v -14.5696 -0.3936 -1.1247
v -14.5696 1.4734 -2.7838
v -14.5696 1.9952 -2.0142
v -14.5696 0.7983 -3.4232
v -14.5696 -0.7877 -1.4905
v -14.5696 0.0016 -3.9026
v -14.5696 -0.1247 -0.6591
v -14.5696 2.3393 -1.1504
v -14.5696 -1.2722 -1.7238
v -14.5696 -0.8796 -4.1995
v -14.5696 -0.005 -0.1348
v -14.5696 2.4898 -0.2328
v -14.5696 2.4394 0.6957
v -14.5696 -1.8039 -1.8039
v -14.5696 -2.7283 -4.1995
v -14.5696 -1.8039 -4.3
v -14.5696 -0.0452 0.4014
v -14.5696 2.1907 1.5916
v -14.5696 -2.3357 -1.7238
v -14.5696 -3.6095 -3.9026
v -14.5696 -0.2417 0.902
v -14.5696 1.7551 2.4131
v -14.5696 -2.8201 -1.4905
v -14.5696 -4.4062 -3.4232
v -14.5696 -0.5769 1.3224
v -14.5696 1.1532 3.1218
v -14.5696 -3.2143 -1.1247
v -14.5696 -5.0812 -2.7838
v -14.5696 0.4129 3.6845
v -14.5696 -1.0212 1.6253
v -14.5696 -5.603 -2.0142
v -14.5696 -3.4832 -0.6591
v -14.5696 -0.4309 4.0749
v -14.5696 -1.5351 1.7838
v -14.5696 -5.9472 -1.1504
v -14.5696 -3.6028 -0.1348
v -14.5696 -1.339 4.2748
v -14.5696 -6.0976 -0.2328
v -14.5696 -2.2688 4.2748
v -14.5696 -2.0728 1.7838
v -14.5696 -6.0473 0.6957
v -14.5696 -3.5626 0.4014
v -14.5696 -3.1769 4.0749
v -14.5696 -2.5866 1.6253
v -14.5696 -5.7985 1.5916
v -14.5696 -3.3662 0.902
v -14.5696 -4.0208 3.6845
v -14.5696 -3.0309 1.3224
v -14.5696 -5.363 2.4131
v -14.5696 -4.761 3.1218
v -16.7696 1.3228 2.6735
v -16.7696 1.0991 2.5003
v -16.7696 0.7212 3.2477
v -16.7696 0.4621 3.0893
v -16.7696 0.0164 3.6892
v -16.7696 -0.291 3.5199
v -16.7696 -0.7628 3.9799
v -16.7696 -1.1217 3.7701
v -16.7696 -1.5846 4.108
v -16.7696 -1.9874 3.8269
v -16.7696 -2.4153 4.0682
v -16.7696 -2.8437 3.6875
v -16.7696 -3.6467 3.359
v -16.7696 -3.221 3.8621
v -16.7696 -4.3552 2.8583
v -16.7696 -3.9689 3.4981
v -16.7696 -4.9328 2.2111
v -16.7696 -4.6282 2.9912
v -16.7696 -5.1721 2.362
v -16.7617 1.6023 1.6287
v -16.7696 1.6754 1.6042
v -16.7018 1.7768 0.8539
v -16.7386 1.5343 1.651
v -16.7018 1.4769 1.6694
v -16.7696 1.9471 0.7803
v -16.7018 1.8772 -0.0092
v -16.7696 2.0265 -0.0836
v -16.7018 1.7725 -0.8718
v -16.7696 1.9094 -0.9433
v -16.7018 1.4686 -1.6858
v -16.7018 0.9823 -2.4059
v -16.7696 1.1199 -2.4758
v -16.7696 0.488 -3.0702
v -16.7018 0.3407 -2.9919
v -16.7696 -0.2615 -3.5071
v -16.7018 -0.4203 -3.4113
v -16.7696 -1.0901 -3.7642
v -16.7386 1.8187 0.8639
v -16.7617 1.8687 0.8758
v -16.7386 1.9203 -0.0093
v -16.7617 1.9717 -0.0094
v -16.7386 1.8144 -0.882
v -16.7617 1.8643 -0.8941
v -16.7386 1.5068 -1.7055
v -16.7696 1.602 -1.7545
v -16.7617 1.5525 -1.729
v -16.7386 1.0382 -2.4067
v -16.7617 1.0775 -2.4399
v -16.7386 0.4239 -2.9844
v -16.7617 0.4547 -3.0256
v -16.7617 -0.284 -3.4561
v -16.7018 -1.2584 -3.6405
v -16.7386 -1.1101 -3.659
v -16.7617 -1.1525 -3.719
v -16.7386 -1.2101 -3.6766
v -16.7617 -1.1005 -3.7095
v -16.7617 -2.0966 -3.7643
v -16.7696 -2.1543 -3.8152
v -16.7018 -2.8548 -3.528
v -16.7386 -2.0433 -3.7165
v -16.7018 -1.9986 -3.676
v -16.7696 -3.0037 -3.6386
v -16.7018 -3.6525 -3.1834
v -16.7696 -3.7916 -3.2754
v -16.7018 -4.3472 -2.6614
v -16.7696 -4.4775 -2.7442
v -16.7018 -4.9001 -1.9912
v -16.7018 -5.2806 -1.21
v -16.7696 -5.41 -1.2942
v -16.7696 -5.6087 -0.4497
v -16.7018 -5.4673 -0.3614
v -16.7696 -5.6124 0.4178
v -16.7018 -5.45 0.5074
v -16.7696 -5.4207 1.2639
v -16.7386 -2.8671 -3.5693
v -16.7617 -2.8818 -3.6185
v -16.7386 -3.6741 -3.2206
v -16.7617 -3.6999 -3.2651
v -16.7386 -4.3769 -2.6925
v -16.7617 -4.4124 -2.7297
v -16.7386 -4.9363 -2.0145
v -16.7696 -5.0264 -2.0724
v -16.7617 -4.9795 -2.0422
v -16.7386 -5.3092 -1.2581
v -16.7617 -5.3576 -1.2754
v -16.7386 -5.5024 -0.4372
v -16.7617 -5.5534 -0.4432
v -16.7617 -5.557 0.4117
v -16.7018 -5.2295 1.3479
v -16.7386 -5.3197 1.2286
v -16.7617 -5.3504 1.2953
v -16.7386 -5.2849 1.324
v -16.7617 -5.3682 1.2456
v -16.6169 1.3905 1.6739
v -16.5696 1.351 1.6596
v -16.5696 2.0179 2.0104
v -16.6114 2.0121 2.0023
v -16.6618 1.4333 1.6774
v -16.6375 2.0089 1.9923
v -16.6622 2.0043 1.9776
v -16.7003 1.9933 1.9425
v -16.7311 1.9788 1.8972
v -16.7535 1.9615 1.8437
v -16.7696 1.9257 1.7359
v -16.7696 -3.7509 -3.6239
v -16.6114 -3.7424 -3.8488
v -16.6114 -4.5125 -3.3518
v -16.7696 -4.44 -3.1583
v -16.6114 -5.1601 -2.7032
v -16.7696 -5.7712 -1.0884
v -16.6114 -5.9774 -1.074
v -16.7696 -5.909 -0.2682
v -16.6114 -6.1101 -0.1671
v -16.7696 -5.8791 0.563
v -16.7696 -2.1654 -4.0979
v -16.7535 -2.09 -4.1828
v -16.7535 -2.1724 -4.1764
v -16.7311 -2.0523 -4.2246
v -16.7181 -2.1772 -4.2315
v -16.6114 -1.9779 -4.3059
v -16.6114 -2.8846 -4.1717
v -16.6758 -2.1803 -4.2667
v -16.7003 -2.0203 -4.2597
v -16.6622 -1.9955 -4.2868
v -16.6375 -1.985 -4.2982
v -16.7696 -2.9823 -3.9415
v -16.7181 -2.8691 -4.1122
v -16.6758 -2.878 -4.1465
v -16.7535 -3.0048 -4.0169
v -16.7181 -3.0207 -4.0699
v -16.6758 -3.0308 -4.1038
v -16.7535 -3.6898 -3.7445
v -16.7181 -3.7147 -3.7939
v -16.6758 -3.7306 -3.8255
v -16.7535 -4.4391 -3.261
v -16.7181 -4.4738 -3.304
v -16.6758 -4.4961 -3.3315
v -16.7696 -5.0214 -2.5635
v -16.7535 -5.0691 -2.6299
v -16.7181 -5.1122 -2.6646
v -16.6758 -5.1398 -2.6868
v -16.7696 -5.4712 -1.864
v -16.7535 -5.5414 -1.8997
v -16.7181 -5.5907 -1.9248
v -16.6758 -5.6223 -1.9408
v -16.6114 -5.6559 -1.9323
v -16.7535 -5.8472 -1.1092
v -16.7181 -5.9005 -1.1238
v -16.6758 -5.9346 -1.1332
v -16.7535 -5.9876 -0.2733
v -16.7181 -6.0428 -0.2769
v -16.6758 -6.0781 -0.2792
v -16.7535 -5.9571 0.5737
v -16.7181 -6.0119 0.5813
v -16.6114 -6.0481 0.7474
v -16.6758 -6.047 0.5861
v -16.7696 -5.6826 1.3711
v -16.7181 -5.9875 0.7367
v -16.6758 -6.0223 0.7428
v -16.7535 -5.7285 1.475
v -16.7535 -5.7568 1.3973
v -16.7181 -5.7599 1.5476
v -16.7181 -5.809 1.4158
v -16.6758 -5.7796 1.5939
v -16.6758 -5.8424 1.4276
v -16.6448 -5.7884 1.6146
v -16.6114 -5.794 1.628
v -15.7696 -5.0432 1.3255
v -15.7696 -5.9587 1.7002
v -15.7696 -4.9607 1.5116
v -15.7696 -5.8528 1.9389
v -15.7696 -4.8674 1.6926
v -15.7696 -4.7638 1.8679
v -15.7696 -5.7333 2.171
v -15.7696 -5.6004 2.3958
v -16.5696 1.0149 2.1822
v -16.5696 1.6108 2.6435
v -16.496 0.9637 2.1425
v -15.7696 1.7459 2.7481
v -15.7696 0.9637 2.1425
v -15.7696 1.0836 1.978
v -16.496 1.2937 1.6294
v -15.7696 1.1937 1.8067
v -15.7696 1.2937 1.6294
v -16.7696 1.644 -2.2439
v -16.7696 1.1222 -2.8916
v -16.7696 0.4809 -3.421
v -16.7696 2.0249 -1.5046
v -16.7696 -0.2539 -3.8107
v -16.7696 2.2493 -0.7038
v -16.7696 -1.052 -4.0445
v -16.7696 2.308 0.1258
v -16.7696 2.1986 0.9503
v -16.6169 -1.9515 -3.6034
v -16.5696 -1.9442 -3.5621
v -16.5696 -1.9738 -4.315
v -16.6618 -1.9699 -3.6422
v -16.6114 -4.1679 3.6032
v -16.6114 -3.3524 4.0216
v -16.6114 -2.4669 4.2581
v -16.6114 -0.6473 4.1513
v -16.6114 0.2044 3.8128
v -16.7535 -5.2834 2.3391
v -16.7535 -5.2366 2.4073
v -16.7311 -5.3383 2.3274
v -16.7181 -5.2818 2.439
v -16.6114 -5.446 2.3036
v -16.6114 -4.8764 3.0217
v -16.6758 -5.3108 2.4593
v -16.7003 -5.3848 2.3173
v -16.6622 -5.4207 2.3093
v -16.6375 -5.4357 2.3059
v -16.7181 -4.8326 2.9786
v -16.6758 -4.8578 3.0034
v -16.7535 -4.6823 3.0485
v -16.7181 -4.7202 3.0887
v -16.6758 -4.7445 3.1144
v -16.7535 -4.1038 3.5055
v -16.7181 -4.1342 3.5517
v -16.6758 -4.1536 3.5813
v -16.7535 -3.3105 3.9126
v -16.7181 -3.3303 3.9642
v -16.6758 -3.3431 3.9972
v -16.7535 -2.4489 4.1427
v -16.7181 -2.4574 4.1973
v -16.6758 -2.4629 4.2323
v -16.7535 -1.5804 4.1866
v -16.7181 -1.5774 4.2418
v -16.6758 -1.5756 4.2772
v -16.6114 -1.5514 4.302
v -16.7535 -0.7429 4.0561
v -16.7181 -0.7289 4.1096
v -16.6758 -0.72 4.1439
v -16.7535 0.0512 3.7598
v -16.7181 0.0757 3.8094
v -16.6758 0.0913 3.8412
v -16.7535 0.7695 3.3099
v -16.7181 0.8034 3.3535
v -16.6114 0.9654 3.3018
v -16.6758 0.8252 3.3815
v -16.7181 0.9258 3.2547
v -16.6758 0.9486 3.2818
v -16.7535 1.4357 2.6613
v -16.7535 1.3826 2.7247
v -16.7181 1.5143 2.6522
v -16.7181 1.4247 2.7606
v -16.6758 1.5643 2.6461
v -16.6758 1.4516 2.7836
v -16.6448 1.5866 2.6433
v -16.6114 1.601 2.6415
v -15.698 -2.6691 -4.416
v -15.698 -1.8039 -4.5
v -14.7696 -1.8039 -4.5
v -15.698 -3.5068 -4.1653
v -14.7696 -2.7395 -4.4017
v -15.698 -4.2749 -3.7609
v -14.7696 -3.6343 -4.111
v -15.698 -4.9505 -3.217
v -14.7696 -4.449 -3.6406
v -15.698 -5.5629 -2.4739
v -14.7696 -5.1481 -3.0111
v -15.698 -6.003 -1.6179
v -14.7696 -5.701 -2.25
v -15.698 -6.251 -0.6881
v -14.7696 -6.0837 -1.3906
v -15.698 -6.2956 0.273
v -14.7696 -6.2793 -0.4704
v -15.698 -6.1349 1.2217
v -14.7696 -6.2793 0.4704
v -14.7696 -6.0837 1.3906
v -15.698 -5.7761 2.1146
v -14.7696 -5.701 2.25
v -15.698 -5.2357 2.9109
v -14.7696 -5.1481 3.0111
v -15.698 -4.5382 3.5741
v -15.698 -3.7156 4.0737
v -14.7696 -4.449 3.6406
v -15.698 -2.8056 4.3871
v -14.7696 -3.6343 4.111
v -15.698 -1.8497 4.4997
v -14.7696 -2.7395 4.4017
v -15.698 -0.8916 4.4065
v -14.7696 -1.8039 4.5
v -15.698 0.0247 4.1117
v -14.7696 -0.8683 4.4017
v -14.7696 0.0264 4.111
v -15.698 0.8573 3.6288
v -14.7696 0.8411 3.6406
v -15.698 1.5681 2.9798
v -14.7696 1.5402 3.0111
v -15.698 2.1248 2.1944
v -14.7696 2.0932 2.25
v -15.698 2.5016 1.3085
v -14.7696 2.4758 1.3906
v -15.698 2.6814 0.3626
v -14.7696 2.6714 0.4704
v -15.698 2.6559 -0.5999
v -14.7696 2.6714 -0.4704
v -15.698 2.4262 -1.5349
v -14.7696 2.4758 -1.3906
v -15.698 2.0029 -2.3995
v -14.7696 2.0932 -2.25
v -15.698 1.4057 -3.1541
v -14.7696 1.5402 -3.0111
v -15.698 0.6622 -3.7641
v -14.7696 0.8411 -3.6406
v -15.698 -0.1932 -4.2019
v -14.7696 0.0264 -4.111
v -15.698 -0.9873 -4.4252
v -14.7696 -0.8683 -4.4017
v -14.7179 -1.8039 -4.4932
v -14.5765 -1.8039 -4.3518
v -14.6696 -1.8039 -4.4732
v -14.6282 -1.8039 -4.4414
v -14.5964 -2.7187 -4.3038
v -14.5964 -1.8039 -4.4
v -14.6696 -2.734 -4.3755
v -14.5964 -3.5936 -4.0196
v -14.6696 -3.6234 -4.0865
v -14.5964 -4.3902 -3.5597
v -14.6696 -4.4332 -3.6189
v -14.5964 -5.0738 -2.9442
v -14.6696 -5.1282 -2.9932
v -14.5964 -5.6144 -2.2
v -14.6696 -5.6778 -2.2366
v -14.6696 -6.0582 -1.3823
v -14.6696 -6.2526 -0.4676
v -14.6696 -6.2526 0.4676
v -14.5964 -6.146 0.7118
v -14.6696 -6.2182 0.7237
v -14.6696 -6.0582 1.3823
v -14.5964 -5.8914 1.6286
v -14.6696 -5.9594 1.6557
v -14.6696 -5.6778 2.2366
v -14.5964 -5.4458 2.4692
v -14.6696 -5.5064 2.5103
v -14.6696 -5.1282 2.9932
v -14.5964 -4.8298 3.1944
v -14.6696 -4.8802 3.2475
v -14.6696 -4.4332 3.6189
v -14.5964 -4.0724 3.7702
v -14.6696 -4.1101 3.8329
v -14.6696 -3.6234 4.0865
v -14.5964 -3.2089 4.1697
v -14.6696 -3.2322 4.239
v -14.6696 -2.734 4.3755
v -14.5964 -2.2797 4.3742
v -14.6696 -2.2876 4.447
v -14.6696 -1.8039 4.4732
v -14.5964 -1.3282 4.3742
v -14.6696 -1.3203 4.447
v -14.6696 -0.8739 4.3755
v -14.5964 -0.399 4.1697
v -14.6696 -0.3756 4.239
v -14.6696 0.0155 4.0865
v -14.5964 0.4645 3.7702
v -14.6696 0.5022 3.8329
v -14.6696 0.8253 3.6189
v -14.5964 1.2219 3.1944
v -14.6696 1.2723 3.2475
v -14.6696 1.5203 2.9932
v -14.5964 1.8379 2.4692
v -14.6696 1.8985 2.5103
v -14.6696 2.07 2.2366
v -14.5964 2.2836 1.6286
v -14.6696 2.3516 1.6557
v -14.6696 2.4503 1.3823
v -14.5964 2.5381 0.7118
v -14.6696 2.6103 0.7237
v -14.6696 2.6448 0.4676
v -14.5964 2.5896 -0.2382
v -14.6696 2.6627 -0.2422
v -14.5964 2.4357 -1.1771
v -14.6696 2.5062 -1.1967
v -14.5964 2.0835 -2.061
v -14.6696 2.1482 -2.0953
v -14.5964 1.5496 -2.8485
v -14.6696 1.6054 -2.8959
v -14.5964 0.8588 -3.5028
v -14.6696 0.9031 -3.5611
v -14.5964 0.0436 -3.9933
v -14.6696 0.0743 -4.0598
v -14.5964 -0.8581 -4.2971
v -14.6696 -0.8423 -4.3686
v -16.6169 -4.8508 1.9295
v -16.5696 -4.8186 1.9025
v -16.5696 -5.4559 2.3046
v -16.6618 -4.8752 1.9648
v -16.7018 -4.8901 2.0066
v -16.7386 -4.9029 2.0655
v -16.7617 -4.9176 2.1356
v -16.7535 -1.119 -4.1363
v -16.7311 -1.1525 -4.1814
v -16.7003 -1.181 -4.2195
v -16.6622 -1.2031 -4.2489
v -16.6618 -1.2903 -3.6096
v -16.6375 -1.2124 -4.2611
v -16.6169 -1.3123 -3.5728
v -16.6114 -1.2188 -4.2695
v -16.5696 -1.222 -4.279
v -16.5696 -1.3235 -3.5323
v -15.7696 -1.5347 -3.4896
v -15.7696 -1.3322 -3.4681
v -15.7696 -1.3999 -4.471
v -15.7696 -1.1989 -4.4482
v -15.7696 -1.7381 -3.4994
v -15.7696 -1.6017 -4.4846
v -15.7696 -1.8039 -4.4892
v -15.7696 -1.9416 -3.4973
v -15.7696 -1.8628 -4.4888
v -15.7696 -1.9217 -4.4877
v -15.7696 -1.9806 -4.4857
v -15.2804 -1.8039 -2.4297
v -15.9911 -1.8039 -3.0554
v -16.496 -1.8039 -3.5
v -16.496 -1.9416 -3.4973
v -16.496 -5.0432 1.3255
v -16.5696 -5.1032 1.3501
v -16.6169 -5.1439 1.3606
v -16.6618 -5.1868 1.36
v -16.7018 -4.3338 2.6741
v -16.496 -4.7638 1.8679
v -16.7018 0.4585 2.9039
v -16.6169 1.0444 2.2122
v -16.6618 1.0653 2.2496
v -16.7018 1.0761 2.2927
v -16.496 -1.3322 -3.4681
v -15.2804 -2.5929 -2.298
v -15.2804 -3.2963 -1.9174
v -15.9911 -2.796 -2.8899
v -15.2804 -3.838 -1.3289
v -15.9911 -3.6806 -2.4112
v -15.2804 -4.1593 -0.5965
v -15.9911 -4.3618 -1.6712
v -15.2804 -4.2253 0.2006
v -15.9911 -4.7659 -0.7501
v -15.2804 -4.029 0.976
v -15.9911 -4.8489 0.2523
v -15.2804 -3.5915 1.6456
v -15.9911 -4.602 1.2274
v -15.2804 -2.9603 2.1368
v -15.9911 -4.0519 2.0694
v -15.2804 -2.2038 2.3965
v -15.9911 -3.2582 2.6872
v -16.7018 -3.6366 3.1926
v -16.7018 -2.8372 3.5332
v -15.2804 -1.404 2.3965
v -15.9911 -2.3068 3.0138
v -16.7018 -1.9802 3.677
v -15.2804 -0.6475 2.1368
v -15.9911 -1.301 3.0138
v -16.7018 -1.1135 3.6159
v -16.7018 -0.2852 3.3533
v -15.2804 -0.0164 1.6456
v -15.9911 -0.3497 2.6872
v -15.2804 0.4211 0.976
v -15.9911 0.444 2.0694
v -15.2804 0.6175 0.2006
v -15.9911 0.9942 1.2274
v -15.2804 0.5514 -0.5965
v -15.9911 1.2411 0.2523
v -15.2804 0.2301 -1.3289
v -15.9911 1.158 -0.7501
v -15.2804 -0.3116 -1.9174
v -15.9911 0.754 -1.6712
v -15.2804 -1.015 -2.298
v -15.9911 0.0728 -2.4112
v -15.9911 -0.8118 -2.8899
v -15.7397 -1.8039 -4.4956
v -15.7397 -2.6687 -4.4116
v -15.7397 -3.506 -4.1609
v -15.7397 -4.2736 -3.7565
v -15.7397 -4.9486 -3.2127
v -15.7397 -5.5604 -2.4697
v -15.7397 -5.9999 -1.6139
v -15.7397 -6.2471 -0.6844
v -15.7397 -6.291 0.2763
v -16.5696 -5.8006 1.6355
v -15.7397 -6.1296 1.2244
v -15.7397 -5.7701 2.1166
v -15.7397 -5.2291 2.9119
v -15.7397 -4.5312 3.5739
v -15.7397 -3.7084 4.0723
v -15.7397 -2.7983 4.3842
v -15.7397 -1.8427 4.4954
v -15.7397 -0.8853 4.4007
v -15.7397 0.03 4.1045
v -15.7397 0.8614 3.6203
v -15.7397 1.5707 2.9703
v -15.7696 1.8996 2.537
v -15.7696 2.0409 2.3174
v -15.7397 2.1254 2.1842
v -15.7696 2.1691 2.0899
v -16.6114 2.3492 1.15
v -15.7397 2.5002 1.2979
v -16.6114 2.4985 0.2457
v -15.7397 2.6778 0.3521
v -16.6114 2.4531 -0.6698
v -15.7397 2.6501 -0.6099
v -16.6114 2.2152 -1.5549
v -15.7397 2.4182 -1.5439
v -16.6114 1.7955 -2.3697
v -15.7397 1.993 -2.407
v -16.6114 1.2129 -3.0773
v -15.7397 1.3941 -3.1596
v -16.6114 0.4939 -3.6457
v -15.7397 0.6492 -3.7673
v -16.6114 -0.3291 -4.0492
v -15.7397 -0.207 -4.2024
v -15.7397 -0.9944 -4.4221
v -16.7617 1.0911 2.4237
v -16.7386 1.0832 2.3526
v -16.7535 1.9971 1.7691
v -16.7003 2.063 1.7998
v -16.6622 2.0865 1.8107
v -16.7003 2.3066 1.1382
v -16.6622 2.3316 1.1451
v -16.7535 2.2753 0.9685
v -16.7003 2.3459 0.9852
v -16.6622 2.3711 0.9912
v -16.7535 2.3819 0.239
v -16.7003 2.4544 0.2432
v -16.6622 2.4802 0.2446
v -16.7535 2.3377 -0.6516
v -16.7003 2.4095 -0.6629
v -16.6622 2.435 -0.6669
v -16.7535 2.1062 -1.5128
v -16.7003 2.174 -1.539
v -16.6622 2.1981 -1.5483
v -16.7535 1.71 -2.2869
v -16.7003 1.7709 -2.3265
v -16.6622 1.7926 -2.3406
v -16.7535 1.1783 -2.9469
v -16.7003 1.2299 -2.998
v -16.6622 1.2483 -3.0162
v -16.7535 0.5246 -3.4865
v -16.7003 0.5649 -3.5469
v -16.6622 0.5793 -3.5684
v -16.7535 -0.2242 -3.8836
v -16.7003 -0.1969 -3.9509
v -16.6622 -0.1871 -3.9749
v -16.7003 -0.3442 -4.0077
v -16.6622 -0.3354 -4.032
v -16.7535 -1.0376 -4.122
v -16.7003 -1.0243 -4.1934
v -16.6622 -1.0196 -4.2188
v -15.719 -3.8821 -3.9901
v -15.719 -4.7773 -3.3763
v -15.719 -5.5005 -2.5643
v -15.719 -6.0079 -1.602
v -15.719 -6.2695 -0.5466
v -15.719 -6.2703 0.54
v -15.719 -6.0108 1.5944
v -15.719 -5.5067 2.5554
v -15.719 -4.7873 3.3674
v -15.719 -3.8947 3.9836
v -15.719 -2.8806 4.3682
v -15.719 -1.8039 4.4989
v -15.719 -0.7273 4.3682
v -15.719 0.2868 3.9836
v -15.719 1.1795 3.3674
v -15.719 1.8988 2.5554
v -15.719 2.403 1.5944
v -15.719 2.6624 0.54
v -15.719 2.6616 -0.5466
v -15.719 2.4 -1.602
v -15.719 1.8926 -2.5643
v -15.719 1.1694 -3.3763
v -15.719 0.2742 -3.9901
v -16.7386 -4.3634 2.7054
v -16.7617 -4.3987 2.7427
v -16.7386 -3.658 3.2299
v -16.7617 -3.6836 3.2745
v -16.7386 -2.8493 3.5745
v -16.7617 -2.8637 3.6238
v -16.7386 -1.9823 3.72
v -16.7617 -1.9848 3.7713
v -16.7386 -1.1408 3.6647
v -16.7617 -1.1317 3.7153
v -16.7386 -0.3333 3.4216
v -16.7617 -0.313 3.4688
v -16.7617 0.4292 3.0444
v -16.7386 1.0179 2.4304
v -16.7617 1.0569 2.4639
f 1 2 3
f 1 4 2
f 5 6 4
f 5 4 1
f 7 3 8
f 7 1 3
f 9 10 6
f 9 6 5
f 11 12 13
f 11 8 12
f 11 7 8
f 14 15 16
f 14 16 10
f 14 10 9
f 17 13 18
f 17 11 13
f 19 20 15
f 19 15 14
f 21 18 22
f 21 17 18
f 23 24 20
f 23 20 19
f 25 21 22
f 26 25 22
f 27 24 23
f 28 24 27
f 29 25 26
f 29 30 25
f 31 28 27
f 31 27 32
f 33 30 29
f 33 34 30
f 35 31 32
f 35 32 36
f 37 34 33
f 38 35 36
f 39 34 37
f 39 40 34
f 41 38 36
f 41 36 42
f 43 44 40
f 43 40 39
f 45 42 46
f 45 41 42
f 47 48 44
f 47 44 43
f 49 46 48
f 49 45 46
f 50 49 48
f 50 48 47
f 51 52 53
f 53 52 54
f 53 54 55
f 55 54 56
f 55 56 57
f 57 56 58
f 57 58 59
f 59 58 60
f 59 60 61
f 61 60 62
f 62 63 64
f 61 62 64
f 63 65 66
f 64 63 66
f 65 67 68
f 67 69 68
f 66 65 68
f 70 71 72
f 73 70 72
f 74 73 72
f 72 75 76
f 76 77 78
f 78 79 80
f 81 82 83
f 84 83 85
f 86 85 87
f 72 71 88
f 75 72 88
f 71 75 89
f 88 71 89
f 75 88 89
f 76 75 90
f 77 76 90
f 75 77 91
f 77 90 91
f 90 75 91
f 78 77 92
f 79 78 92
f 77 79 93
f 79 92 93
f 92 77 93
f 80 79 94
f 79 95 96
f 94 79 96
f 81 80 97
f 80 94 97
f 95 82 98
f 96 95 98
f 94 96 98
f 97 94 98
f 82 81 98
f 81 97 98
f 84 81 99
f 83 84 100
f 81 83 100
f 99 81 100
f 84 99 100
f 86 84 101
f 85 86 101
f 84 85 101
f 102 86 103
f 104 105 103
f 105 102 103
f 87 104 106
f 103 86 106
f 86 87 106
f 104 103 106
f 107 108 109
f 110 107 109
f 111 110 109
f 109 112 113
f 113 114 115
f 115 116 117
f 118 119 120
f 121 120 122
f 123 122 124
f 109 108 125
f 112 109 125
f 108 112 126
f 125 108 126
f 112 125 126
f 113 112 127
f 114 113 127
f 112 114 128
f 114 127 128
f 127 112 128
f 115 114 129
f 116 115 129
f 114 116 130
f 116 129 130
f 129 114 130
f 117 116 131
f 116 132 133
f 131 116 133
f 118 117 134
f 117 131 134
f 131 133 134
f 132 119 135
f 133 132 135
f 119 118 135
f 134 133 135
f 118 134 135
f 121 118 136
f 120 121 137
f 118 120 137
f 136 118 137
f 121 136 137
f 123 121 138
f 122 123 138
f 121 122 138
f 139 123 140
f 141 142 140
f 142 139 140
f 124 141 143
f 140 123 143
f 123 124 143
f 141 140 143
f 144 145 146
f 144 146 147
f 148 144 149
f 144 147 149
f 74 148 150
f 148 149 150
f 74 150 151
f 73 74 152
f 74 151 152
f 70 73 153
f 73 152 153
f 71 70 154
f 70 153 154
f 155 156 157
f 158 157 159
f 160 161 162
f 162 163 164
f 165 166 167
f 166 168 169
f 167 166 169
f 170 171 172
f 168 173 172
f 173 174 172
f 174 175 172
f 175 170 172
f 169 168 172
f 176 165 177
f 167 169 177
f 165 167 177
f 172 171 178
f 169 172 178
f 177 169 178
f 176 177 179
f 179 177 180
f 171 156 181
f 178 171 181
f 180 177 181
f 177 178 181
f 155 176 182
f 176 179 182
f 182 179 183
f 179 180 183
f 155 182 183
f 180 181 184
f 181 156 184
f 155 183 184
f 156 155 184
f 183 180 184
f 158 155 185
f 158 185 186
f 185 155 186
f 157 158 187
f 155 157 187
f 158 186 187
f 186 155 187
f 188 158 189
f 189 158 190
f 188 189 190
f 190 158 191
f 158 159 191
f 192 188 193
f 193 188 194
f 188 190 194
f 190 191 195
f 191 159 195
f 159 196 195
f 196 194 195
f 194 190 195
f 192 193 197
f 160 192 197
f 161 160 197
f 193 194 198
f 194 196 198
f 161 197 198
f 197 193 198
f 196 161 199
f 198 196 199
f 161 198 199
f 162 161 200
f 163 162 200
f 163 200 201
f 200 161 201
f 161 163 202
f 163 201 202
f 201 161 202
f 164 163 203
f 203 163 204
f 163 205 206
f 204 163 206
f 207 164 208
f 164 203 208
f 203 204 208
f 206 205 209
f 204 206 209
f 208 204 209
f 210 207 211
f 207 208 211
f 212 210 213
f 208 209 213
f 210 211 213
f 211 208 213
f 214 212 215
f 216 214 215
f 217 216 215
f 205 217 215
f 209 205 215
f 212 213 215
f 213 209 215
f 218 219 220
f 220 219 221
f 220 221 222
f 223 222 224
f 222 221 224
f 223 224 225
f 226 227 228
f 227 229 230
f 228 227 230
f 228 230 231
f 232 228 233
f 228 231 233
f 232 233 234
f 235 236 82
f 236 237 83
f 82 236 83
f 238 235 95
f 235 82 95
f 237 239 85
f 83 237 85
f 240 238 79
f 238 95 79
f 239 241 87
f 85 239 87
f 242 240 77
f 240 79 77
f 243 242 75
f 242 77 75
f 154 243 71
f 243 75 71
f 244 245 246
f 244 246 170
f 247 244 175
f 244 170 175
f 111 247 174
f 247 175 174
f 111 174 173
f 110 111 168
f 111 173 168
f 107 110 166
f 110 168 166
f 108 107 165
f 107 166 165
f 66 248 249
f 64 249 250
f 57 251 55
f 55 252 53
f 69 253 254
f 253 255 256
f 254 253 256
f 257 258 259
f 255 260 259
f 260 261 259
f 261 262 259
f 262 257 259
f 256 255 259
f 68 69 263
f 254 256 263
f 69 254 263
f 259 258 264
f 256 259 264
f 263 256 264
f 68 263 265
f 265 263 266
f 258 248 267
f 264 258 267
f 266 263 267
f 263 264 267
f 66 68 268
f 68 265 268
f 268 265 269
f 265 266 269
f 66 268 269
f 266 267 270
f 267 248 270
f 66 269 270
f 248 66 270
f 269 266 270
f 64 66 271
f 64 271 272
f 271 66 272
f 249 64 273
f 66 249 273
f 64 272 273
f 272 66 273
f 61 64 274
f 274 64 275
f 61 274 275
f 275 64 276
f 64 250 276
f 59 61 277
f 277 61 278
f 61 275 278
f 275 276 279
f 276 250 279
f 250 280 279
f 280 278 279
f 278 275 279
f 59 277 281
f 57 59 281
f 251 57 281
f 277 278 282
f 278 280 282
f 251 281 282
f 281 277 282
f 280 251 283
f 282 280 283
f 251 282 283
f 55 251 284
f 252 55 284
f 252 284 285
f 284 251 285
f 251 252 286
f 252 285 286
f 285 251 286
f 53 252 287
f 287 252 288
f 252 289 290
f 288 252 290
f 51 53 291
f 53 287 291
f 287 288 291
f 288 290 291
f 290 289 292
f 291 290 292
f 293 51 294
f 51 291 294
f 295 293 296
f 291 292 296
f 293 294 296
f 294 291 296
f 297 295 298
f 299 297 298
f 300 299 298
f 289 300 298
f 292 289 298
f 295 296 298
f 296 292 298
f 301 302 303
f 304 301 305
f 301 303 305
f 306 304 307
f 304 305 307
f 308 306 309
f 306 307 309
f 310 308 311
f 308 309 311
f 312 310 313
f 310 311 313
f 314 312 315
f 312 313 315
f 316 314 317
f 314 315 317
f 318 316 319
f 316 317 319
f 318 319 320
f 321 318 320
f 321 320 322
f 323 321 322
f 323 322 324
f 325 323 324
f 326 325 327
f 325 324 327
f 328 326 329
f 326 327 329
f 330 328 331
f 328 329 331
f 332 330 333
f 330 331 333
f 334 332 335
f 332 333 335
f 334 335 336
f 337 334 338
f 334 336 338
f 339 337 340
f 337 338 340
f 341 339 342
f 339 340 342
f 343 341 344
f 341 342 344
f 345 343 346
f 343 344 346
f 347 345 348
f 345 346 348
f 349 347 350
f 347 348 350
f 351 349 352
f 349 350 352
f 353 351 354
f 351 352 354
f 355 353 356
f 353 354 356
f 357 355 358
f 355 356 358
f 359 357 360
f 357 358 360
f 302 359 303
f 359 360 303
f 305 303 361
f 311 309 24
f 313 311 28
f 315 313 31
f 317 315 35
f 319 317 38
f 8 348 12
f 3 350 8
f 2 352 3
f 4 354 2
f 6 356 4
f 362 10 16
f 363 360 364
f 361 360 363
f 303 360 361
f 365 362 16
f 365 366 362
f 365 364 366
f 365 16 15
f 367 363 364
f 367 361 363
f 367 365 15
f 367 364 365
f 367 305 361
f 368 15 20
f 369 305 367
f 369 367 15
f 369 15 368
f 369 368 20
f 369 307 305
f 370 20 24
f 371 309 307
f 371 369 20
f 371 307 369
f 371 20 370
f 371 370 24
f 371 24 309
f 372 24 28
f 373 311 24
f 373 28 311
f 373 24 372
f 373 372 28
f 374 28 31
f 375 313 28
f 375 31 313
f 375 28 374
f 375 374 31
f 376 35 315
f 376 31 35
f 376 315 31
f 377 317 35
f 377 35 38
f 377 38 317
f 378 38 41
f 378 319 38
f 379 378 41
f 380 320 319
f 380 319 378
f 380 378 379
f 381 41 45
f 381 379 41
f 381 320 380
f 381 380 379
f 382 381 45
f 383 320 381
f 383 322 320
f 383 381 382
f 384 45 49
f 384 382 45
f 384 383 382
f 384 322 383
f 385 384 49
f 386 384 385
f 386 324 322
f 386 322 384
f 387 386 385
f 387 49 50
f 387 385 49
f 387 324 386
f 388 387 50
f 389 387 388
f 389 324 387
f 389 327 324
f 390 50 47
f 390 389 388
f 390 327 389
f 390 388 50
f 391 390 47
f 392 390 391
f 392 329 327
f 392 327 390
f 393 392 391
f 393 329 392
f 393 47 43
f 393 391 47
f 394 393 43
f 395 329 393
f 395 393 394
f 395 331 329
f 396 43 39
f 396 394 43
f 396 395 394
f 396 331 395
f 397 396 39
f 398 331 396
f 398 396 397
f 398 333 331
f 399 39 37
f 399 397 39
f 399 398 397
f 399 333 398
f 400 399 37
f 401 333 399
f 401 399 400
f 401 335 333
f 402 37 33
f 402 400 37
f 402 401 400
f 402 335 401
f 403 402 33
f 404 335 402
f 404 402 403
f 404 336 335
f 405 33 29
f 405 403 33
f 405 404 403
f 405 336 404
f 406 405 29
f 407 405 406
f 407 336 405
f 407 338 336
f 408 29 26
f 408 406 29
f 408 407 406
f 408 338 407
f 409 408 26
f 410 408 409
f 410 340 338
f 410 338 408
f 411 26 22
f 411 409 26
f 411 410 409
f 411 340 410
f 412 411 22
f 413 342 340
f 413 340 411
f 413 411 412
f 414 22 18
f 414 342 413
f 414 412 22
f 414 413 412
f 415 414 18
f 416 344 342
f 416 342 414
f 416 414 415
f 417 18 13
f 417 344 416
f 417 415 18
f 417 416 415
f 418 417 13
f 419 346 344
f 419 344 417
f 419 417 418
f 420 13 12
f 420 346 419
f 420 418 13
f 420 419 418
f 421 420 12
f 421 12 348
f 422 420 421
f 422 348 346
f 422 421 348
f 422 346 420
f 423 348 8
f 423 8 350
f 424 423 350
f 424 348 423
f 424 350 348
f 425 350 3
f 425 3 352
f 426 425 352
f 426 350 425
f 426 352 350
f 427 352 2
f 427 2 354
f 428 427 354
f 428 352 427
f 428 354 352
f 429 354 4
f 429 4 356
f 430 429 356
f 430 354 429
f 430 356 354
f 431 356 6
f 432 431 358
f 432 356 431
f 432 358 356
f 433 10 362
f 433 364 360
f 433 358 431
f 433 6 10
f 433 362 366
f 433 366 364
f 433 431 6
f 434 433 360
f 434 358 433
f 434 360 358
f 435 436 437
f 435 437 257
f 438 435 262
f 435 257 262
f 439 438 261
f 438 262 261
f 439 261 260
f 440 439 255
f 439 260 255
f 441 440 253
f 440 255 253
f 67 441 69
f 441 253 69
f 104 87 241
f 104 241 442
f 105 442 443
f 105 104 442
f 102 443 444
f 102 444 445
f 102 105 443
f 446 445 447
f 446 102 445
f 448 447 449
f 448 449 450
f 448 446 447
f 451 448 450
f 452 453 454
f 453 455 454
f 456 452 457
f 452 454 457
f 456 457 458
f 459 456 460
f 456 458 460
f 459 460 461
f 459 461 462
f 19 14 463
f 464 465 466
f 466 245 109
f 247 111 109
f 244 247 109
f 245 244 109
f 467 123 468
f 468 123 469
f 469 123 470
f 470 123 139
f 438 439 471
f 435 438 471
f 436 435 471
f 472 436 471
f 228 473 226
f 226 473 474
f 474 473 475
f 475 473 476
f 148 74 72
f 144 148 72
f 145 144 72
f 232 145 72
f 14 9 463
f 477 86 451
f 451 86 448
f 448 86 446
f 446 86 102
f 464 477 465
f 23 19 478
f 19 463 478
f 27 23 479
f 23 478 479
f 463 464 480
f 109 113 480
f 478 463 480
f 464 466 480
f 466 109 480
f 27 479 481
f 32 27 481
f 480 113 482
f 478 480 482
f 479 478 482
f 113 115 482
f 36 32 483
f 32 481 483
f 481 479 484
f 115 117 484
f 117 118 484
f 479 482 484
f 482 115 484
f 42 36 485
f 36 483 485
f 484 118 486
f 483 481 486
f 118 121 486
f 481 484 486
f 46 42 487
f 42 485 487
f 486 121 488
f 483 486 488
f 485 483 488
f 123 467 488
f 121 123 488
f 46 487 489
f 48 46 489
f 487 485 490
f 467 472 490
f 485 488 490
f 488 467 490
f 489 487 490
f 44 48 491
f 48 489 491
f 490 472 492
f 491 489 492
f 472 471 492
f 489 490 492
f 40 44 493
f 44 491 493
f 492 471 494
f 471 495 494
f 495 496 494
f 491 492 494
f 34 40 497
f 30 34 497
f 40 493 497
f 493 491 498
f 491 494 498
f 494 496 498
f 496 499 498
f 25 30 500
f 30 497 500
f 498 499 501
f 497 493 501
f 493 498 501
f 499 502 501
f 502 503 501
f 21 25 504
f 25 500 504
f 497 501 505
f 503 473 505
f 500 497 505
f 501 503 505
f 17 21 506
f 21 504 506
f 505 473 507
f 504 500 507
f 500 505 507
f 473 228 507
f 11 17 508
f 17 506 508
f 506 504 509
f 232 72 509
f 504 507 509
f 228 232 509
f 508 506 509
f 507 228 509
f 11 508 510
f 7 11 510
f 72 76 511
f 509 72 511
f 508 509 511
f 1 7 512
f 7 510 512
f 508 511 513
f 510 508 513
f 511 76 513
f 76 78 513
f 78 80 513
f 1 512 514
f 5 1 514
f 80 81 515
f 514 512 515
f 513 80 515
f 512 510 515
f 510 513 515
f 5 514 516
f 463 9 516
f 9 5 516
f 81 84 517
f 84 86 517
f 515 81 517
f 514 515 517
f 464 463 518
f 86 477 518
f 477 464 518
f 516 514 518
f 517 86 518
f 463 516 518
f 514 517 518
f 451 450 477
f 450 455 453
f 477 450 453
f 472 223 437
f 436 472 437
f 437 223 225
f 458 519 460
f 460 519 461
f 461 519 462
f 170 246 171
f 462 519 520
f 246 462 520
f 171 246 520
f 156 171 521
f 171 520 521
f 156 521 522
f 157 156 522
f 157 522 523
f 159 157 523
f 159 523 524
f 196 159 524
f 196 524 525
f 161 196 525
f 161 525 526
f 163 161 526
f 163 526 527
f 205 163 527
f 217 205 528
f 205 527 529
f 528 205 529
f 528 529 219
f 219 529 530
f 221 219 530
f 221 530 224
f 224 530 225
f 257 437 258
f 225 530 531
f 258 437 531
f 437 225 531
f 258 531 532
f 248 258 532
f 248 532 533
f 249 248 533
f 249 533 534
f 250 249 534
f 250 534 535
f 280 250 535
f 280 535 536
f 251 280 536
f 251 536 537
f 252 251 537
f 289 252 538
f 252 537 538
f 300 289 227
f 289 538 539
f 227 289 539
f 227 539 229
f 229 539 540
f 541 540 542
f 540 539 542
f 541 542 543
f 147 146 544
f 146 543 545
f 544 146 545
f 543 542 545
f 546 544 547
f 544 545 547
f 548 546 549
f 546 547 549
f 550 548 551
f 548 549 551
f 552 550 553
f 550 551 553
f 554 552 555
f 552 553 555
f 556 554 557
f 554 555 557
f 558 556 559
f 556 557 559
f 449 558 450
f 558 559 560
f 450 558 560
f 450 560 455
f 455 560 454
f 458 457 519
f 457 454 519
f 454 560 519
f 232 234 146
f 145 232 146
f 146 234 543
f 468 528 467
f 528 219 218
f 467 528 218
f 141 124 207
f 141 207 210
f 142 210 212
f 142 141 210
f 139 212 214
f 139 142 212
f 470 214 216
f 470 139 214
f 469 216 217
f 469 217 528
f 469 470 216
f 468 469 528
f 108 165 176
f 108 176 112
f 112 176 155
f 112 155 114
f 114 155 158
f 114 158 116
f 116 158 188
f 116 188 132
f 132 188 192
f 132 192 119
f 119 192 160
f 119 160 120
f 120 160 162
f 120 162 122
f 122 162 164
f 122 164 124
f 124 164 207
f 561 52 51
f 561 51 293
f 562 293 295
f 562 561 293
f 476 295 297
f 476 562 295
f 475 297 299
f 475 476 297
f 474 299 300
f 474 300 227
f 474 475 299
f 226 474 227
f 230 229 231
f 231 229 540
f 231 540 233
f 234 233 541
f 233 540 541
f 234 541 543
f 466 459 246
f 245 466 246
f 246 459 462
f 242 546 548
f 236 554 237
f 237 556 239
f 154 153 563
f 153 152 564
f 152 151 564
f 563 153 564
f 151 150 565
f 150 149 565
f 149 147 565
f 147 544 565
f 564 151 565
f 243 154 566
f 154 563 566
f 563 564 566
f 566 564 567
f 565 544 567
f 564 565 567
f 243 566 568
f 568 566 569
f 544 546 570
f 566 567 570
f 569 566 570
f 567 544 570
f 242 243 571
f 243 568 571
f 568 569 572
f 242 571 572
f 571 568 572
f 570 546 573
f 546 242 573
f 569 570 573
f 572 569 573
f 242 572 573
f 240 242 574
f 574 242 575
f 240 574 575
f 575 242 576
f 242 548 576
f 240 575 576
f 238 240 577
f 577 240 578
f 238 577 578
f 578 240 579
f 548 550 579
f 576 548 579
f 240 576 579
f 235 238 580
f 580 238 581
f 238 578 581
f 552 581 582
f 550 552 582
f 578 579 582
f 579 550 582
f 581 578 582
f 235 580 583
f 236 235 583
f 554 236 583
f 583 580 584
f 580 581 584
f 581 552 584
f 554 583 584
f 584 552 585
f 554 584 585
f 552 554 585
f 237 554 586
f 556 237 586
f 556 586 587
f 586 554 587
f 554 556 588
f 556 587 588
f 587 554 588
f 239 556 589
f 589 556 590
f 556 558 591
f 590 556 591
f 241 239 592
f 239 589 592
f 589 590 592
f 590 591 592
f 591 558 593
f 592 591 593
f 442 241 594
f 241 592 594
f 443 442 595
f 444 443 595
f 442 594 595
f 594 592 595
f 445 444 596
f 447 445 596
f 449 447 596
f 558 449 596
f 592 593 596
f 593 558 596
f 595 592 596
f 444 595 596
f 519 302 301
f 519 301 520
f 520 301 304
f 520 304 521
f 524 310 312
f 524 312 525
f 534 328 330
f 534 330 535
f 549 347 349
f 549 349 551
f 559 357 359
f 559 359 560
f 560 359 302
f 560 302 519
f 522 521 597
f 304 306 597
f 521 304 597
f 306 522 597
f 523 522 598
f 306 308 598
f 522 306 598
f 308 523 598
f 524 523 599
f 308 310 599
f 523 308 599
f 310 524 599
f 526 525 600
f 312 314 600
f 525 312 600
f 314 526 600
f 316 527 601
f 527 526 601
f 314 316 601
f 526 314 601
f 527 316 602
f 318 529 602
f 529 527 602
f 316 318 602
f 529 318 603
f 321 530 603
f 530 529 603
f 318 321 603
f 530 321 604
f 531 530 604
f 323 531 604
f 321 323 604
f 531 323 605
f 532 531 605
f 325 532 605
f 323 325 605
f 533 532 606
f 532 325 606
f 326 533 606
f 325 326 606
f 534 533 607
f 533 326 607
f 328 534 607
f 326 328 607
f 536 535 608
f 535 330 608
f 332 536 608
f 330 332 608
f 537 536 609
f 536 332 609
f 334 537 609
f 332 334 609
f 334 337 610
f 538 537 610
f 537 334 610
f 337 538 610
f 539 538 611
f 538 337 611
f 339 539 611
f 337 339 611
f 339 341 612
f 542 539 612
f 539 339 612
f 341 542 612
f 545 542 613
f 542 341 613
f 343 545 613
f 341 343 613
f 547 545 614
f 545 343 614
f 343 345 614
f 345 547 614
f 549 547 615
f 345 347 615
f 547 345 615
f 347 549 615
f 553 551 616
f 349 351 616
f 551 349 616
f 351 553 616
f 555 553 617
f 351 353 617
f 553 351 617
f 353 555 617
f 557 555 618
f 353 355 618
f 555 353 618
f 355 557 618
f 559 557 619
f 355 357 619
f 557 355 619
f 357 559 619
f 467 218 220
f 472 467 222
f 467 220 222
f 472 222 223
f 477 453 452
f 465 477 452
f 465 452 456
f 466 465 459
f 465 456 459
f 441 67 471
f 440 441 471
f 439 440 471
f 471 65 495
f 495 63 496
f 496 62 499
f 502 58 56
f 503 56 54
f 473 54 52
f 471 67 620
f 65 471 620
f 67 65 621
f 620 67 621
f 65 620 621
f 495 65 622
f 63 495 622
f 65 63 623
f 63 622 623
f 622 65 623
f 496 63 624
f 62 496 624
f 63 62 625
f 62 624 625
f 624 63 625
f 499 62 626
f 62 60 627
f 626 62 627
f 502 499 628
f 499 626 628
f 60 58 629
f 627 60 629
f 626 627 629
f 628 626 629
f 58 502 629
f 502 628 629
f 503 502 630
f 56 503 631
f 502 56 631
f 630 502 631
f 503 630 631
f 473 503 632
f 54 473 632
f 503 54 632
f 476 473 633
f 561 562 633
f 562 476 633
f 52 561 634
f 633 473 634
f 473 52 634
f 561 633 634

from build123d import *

# Parameters (mm, degrees)
CUT_EXTRUDE_1_DEPTH      = 1
PATTERN_CIRCULAR_1_COUNT = 3
FILLET_1_R               = 0.2


with BuildPart() as part:
    # 草图1 → 旋转1 (revolve)
    with BuildSketch(Plane.XY):
        Polygon((-16.769649529, 1.936980405), (-14.569649529, 0), (-14.569649529, 2.471705001), (-14.569649529, 2.696064574), (-15.719072987, 2.696064574), (-16.769649529, 2.471705001), align=None)
    revolve(axis=Axis((-14.569649529, -1.803935426, 0), (-1, 0, 0)))

    # 草图6 → 切除-拉伸1 (cut)
    with BuildSketch(Plane.ZY.offset(16.769649529)):
        with BuildLine():
            Line((1.629390424, 1.293658293), (2.094930545, 2.17868507))
            ThreePointArc((2.094930545, 2.17868507), (2.434066949, 1.980944769), (2.754678634, 1.754399244))
            Line((2.754678634, 1.754399244), (2.142527827, 0.963658206))
            ThreePointArc((2.142527827, 0.963658206), (1.893163183, 1.139860281), (1.629390424, 1.293658293))
        make_face()
    cut_extrude_1 = extrude(amount=-CUT_EXTRUDE_1_DEPTH, mode=Mode.SUBTRACT)

    # 阵列(圆周)1: 切除-拉伸1 ×3 about axis
    pattern_circular_1_axis = Axis((-16.769649529, -1.803935426, 0), (1, 0, 0))
    for i in range(1, PATTERN_CIRCULAR_1_COUNT):
        add(cut_extrude_1.rotate(pattern_circular_1_axis, i * 360 / PATTERN_CIRCULAR_1_COUNT), mode=Mode.SUBTRACT)

    # 圆角1
    fillet_1_edges = [part.edges().sort_by_distance(p)[0] for p in [
        (-15.719072987, -6.303935426, 0),
        (-14.569649529, -6.303935426, 0),
        (-16.769649529, 1.365574581, 2.453670694),
        (-16.769649529, -2.008713628, 4.270733771),
        (-16.769649529, -5.193667937, 2.139160363),
        (-16.769649529, -1.983103443, 3.736622817),
        (-16.769649529, 1.743498047, 1.866014286),
        (-16.769649529, 1.013905087, -2.460533703),
        (-16.769649529, -1.263749276, -3.971711531),
        (-16.769649529, 1.416685768, -2.812241132),
        (-16.769649529, -5.513631583, 1.518040837),
        (-16.769649529, -5.400110263, -2.312710011),
        (-16.769649529, -1.961636387, -4.005174649),
        (-16.769649529, -4.950361701, -2.023475463),
    ]]
    fillet(fillet_1_edges, radius=FILLET_1_R)


solid = part.part
